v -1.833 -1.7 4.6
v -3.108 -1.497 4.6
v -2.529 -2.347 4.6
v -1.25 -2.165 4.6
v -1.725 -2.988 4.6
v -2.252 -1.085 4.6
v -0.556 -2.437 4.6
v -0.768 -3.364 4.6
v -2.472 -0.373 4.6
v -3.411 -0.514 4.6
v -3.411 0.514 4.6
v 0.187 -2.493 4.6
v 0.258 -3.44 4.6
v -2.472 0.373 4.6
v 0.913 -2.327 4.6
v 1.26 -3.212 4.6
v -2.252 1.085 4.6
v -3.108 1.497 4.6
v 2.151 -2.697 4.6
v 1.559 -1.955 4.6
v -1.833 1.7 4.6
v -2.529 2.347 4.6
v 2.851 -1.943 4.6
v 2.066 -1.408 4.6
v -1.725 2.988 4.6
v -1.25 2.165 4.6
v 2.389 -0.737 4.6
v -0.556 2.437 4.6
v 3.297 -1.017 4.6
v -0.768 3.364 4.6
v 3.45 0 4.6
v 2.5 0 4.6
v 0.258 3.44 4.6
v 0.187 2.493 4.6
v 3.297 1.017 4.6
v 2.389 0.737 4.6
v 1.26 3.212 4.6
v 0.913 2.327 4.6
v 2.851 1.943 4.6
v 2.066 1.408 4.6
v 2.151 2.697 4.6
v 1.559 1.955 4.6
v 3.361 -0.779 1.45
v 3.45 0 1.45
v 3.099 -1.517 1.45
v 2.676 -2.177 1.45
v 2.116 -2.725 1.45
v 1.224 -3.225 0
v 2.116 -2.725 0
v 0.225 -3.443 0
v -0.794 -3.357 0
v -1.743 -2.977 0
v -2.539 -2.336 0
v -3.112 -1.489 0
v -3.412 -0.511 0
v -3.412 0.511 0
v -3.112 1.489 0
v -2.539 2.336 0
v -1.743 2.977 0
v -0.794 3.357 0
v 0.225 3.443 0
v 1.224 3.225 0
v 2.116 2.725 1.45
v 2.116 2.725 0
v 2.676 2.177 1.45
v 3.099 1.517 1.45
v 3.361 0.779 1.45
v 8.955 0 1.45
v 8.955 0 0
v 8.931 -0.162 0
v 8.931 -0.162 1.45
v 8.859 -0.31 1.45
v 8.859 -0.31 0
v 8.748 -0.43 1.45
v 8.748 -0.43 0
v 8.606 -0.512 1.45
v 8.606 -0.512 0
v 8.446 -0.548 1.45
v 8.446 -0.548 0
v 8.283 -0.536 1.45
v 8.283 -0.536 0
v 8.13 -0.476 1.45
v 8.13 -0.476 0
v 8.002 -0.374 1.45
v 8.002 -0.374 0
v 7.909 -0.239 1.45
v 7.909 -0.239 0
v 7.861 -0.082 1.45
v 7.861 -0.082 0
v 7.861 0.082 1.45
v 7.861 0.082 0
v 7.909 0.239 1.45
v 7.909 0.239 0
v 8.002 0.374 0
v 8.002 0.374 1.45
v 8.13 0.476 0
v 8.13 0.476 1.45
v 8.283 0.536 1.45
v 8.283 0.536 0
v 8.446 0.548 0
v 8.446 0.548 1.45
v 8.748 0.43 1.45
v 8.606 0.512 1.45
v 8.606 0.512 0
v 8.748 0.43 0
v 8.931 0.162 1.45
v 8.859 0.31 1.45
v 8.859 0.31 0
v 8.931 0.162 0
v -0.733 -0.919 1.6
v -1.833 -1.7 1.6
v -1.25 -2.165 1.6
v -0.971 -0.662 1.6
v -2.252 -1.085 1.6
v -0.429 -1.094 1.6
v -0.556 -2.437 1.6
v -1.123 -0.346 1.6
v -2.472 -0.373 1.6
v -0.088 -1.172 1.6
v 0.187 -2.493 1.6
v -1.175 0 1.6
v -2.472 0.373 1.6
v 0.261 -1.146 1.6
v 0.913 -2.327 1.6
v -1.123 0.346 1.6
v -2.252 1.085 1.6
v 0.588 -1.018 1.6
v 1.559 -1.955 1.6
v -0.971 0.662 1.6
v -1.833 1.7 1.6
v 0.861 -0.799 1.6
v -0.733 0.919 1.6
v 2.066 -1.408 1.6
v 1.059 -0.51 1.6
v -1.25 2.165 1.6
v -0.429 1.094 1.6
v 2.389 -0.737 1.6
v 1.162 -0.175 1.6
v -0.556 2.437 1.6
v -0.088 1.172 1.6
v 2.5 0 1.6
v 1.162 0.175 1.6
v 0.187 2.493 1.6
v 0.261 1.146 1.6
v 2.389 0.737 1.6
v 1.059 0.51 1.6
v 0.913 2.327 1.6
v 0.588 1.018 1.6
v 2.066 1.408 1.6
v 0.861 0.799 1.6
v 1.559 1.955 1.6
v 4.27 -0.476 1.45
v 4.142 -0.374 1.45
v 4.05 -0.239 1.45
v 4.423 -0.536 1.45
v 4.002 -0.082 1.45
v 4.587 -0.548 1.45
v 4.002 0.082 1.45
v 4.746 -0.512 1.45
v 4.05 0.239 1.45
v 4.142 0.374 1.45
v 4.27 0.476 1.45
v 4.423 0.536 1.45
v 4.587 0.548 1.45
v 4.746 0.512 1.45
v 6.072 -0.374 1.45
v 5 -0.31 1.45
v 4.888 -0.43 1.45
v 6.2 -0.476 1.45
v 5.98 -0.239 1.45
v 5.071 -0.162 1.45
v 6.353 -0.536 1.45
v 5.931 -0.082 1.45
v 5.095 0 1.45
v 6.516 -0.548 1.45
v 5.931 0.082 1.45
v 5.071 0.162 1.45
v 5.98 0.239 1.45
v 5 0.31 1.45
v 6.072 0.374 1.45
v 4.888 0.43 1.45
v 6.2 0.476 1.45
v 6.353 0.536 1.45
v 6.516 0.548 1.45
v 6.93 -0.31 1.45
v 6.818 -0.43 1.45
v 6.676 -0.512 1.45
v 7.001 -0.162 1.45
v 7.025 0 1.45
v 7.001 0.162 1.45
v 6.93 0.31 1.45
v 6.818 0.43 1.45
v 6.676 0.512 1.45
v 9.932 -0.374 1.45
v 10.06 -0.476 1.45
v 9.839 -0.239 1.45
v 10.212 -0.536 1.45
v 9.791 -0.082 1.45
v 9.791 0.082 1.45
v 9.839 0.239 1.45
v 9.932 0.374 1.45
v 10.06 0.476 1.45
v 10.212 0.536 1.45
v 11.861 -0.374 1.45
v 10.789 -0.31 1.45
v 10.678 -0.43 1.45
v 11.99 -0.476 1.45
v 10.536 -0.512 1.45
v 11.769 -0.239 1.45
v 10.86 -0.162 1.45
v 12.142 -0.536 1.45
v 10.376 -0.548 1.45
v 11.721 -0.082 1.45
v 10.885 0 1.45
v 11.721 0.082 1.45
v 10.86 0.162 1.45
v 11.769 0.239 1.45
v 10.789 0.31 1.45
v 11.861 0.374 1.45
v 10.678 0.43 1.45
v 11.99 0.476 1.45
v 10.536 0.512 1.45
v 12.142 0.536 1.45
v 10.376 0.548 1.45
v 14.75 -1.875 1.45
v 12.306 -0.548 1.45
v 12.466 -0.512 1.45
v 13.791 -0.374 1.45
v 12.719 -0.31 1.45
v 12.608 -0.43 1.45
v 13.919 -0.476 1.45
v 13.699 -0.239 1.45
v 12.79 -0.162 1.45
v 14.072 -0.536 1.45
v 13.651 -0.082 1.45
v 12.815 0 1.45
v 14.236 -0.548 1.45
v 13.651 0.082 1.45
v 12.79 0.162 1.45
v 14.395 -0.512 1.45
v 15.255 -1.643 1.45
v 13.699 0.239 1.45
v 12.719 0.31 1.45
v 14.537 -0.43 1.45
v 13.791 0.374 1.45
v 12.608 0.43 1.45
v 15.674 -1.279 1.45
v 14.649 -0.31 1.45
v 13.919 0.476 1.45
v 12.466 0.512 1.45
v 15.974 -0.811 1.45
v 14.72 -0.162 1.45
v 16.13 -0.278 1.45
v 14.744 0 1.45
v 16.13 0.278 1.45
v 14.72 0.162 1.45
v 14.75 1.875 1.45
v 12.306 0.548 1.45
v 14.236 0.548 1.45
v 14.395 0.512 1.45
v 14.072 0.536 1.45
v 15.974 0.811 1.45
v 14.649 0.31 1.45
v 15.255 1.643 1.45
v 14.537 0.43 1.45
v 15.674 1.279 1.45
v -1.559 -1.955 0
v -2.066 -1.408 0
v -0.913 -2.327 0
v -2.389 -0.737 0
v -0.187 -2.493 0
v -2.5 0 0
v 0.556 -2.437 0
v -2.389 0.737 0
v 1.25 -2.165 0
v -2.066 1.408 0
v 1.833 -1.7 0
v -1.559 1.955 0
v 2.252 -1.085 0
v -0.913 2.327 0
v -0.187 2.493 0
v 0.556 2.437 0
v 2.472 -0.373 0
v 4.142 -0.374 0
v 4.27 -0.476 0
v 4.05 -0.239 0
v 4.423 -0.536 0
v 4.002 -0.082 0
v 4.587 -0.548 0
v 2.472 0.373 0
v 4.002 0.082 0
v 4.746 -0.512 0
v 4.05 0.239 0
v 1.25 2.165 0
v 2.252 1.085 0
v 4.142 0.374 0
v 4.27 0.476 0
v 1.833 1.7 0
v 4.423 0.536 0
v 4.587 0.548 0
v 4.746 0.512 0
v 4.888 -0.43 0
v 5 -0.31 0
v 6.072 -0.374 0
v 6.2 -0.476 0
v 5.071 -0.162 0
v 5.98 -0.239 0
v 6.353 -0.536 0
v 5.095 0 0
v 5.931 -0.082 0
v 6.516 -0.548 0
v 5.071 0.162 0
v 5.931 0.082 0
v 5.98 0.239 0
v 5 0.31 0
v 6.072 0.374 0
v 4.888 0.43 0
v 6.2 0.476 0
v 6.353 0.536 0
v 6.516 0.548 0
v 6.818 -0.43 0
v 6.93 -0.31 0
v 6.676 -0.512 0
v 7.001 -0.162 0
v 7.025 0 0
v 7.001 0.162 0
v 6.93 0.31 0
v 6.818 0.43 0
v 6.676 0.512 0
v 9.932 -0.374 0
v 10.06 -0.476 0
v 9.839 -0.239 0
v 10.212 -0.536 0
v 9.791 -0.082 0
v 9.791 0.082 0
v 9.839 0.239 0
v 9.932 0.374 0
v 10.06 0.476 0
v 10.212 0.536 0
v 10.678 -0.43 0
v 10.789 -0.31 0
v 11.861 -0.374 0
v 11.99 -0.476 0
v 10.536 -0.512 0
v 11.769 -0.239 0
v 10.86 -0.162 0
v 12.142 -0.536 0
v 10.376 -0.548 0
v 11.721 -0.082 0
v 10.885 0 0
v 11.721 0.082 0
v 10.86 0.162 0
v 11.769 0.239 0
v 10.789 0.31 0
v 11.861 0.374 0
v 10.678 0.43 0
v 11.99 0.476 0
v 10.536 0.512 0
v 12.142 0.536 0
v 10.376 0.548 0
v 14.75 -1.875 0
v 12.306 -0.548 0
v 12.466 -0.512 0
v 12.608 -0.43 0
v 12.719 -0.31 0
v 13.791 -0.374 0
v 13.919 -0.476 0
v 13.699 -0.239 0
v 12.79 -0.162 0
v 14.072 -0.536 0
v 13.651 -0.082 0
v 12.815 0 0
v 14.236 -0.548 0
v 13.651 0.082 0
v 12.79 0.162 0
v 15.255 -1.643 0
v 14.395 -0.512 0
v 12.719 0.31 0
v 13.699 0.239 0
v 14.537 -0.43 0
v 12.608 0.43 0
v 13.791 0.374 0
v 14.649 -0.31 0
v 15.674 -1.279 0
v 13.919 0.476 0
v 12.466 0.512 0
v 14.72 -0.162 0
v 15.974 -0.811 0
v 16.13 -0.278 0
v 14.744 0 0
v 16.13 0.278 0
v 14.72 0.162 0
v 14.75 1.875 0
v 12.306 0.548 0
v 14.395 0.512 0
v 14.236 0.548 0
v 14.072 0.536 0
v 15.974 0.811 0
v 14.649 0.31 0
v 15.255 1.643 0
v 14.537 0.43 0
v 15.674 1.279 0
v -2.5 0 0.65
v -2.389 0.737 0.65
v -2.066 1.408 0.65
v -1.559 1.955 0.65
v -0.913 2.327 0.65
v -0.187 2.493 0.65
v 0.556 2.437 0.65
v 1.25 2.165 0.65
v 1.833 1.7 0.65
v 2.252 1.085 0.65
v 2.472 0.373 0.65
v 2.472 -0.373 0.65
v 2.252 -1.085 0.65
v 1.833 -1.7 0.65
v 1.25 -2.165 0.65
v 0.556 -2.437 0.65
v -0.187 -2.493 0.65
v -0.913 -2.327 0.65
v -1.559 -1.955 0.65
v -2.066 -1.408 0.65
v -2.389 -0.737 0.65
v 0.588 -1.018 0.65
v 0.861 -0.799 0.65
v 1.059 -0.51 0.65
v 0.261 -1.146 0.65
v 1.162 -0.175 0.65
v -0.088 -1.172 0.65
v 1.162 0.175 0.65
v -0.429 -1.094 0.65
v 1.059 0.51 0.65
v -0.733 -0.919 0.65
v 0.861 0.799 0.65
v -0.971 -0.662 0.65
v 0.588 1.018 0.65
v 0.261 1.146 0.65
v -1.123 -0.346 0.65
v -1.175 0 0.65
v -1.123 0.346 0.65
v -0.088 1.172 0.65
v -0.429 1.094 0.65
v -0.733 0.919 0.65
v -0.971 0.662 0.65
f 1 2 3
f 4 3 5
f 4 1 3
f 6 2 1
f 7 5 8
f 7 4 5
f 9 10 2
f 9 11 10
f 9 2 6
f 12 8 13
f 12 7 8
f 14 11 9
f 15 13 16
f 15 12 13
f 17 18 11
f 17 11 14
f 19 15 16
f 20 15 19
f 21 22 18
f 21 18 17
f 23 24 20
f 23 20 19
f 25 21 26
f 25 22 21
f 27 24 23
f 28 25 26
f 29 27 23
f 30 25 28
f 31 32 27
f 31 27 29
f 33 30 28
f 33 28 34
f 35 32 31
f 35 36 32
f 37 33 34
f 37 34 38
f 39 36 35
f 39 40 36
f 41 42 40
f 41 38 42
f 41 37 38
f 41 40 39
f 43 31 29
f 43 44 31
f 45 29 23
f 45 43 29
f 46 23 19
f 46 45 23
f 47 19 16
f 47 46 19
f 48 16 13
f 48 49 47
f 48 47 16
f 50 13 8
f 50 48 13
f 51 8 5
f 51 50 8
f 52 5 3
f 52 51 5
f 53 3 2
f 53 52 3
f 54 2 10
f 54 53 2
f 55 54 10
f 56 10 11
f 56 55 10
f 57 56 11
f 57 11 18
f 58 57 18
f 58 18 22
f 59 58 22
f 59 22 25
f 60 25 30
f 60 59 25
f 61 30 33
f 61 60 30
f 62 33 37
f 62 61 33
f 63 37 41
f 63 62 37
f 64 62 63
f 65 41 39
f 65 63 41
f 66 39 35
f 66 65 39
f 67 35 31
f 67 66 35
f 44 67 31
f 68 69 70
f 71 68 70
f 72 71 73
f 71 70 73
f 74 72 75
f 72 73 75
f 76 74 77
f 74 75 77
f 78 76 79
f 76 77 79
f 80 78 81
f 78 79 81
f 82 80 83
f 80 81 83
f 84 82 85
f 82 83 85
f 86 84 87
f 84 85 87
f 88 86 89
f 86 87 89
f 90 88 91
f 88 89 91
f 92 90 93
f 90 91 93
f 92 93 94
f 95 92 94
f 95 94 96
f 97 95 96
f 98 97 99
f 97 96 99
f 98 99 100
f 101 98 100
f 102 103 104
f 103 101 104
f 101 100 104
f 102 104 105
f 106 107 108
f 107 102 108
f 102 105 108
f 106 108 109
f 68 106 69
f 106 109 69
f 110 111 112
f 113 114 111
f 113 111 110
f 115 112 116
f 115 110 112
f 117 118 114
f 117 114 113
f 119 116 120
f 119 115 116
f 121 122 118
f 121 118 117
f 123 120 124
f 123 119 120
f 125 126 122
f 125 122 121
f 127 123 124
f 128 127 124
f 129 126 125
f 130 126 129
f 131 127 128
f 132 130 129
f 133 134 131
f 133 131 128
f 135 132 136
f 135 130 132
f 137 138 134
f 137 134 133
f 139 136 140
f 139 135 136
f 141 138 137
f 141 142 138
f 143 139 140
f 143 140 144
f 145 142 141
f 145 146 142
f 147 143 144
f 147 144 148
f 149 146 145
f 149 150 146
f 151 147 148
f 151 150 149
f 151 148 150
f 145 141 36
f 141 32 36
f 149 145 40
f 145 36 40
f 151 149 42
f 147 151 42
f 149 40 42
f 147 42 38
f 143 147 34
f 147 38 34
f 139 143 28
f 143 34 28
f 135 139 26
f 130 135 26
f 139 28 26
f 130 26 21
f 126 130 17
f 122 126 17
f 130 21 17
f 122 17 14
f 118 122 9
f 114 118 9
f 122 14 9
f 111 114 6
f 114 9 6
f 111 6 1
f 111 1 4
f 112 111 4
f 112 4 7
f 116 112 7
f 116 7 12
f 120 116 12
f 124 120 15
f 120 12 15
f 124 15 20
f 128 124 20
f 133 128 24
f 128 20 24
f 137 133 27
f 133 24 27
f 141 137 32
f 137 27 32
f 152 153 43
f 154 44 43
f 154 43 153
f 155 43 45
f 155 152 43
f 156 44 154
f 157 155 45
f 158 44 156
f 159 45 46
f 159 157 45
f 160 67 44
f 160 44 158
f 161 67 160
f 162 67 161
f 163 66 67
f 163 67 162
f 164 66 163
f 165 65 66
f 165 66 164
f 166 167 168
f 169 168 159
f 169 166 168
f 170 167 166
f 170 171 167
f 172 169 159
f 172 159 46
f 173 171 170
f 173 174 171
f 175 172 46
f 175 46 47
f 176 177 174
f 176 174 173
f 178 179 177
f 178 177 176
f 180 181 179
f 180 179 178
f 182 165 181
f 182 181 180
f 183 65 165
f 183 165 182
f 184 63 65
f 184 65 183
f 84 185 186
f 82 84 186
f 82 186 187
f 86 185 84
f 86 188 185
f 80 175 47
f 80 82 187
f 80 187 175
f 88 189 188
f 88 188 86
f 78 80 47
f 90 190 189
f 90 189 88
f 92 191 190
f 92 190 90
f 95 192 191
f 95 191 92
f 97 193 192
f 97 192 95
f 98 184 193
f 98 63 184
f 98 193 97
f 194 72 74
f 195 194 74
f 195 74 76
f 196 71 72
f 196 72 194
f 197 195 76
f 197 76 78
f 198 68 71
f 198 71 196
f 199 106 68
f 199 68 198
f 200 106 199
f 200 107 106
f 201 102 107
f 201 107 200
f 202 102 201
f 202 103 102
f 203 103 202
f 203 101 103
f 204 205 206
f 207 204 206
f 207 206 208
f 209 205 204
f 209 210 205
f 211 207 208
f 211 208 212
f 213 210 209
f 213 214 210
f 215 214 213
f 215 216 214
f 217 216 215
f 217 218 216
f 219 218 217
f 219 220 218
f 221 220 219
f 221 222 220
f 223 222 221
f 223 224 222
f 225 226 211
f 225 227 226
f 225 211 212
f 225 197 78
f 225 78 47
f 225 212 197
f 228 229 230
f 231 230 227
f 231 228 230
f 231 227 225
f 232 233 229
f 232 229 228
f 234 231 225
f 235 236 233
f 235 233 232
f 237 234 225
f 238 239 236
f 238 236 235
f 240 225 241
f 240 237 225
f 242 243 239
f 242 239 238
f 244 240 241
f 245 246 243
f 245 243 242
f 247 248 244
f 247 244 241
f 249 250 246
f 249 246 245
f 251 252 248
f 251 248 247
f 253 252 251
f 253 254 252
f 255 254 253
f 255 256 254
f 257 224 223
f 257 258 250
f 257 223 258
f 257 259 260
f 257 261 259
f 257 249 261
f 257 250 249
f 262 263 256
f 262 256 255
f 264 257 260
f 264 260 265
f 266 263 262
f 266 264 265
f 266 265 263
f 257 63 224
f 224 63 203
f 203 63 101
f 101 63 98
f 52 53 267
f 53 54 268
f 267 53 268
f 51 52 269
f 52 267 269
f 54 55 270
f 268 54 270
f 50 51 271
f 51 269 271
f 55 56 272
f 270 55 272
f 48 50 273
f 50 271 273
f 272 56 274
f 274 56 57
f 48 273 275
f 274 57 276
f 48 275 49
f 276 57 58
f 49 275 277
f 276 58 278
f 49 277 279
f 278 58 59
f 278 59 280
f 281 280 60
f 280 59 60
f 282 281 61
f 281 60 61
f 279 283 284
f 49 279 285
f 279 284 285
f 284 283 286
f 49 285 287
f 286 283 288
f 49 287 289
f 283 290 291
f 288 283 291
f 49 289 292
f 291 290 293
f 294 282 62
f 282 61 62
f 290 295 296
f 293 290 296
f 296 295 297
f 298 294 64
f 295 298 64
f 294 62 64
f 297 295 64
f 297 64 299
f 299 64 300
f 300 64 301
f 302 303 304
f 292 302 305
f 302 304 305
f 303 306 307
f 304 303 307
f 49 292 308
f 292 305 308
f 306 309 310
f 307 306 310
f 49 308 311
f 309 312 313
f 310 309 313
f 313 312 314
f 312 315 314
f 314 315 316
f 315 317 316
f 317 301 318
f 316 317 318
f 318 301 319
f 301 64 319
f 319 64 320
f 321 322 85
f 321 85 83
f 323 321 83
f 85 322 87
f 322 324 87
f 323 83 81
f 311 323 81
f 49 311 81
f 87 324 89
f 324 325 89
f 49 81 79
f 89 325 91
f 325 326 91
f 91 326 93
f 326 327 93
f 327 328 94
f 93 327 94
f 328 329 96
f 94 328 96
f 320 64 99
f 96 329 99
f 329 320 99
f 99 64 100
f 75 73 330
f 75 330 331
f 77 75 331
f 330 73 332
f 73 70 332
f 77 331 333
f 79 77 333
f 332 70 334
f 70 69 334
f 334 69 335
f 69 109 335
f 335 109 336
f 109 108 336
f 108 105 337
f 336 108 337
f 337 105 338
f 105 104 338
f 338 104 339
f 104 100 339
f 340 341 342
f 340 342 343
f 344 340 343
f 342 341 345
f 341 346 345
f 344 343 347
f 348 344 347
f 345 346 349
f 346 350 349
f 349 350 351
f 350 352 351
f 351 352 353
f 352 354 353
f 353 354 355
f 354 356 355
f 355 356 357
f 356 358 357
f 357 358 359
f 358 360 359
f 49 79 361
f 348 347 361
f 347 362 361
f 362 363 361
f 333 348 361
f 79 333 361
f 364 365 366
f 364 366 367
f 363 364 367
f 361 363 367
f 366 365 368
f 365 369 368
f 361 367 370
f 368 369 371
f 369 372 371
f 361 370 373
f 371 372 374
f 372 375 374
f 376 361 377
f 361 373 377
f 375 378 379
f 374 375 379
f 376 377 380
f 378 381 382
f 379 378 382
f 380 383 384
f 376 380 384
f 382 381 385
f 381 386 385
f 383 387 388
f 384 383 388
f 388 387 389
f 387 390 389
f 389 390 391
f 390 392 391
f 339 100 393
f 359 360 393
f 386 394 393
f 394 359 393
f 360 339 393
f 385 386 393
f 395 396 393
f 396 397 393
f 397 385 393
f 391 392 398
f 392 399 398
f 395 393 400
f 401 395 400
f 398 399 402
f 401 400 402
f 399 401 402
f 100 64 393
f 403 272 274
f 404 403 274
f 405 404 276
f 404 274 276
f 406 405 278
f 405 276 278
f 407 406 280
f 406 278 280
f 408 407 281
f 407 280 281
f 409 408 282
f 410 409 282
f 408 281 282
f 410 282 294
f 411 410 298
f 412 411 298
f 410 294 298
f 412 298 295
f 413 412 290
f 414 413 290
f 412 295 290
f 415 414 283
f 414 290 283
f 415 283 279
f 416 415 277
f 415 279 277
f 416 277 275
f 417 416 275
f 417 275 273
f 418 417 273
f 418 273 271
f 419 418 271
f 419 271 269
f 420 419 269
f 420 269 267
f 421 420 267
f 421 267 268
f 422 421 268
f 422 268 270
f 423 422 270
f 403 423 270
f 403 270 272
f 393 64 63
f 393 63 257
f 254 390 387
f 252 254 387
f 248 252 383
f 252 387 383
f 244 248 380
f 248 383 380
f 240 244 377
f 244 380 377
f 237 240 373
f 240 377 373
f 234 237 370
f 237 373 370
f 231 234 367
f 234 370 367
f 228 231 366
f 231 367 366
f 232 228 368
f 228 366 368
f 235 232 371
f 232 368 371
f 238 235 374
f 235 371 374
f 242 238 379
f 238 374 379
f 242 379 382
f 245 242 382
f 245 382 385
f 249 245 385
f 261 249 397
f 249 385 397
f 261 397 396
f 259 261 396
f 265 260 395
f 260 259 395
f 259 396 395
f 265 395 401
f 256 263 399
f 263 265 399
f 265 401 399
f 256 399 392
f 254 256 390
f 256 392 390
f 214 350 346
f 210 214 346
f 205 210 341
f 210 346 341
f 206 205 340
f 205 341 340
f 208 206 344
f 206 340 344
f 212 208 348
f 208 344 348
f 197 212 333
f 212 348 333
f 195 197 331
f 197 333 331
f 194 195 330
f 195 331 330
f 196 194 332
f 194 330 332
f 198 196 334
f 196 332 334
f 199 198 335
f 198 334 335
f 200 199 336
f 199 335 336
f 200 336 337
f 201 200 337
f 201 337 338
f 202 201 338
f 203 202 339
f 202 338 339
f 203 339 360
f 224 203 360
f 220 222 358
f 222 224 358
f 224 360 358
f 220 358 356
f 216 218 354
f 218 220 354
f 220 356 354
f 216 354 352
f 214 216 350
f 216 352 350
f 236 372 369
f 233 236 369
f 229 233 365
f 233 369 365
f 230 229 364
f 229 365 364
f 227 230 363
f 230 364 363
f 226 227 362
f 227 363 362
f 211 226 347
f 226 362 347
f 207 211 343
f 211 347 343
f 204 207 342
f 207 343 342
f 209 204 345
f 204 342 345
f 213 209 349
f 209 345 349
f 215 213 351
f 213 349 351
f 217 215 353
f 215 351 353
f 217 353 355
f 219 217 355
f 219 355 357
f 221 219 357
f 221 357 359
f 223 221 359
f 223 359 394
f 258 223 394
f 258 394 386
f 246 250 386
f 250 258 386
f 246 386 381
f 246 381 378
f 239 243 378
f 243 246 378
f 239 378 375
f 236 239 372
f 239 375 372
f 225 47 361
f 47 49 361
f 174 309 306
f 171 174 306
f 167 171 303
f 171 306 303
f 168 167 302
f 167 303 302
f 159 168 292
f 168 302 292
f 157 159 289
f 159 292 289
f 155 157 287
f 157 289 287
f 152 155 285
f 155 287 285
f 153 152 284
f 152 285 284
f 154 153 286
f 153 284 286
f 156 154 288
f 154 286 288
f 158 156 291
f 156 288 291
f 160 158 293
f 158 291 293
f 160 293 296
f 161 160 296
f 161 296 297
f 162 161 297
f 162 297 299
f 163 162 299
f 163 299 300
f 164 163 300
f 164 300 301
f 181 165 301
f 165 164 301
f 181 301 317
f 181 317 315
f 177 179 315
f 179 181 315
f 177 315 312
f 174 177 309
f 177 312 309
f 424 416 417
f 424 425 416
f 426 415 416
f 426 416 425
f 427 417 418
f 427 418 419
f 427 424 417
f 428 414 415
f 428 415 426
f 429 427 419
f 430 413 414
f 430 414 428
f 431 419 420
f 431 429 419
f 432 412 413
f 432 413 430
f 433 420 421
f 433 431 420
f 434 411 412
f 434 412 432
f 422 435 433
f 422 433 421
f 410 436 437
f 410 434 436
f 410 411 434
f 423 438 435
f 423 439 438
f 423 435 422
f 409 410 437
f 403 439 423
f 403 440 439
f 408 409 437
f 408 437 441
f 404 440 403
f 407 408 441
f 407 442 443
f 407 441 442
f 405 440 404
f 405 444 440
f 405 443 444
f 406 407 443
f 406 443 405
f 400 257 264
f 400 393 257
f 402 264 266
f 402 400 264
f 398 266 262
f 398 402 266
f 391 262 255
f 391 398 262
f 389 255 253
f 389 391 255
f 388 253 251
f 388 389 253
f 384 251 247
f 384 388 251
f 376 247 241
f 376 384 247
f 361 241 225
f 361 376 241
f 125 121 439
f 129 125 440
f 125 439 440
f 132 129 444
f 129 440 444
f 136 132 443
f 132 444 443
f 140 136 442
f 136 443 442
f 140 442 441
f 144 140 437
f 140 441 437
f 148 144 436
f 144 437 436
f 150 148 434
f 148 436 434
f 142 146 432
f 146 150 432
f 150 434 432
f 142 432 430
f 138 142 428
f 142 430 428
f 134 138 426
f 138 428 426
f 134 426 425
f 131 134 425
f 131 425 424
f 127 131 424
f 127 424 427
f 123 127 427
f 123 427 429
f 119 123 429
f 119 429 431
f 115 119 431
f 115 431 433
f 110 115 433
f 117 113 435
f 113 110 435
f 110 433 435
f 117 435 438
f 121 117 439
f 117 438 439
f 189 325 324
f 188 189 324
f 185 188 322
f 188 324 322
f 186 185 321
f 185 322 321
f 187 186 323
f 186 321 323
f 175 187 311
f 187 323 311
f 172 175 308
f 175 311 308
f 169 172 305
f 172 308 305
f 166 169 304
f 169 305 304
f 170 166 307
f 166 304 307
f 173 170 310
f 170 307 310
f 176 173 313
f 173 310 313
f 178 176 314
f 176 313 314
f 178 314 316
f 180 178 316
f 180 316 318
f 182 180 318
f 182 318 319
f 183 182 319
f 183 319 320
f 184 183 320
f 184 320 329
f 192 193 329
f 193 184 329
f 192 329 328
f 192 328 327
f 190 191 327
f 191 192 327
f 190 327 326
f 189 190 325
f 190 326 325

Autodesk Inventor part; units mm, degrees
ref_plane "YZ Plane" through (0, 0, 0) normal (1, 0, 0) x (0, 1, 0)
ref_plane "XZ Plane" through (0, 0, 0) normal (0, 1, 0) x (-1, 0, 0)
ref_plane "XY Plane" through (0, 0, 0) normal (0, 0, 1) x (1, 0, 0)
sketch "Sketch1" plane through (0, 0, 0) normal (0, 0, 1) x (1, 0, 0)
  circle A0 centre (0, 0) radius 3.45
  line L0 (0, 0) -> (14.75, 0) construction
  line L1 (14.75, 0) -> (14.75, 1.875) construction
  line L2 (14.75, 0) -> (14.75, -1.875) construction
  line L3 (14.75, 0) -> (16.15, 0) construction
  arc A1 (14.75, -1.875) -> (14.75, 1.875) centre (14.1944, 0) ccw
  line L4 (2.1159, 2.725) -> (2.1159, -2.725) construction
  line L5 (2.1159, 2.725) -> (14.75, 1.875)
  line L6 (2.1159, -2.725) -> (14.75, -1.875)
  circle A2 centre (14.1944, 0) radius 0.55
  circle A3 centre (4.5454, 0) radius 0.55
  circle A4 centre (6.4752, 0) radius 0.55
  circle A5 centre (8.405, 0) radius 0.55
  circle A6 centre (10.3348, 0) radius 0.55
  circle A7 centre (12.2646, 0) radius 0.55
  dimension "d0" = 6.9
  dimension "d1" = 14.75
  dimension "d2" = 1.875
  dimension "d3" = 1.875
  dimension "d4" = 1.4
  dimension "d5" = 5.45
  dimension "d12" = 1.1
  dimension "d13" = 1.1
  dimension "d14" = 1.1
  dimension "d15" = 1.1
  dimension "d16" = 1.1
  dimension "d17" = 1.1
  dimension "d18" = 1.9298
  dimension "d19" = 1.9298
  dimension "d20" = 1.9298
  dimension "d21" = 1.9298
  dimension "d22" = 1.9298
extrude "Extrusion1" add sketch "Sketch1" along normal blind 1.45 contours A0 L5 A1 L6
extrude "Extrusion2" add sketch "Sketch1" along normal blind 4.6 contours A0
sketch "Sketch2" plane through (0, 0, 0) normal (0, 0, -1) x (-1, 0, 0)
  arc A0 (-2.1159, -2.725) -> (-2.1159, 2.725) centre (0, 0) ccw projected
  circle A1 centre (0, 0) radius 1.175
  dimension "d27" = 2.35
extrude "Extrusion3" cut sketch "Sketch2" against normal up to next
sketch "Sketch3" plane through (0, 0, 4.6) normal (0, 0, 1) x (1, 0, 0)
  circle A0 centre (0, 0) radius 1.175 projected
  circle A1 centre (0, 0) radius 3.45 projected
  circle A2 centre (0, 0) radius 2.5
  dimension "d30" = 5
extrude "Extrusion4" cut sketch "Sketch3" against normal blind 3 contours A2
sketch "Sketch4" plane through (0, 0, 0) normal (0, 0, -1) x (-1, 0, 0)
  circle A0 centre (0, 0) radius 1.175 projected
  circle A1 centre (0, 0) radius 2.5 projected
  circle A2 centre (0, 0) radius 2.5 projected
  circle A3 centre (0, 0) radius 2.5
extrude "Extrusion5" cut sketch "Sketch4" against normal blind 0.65
properties part number "Servo_Arm"
